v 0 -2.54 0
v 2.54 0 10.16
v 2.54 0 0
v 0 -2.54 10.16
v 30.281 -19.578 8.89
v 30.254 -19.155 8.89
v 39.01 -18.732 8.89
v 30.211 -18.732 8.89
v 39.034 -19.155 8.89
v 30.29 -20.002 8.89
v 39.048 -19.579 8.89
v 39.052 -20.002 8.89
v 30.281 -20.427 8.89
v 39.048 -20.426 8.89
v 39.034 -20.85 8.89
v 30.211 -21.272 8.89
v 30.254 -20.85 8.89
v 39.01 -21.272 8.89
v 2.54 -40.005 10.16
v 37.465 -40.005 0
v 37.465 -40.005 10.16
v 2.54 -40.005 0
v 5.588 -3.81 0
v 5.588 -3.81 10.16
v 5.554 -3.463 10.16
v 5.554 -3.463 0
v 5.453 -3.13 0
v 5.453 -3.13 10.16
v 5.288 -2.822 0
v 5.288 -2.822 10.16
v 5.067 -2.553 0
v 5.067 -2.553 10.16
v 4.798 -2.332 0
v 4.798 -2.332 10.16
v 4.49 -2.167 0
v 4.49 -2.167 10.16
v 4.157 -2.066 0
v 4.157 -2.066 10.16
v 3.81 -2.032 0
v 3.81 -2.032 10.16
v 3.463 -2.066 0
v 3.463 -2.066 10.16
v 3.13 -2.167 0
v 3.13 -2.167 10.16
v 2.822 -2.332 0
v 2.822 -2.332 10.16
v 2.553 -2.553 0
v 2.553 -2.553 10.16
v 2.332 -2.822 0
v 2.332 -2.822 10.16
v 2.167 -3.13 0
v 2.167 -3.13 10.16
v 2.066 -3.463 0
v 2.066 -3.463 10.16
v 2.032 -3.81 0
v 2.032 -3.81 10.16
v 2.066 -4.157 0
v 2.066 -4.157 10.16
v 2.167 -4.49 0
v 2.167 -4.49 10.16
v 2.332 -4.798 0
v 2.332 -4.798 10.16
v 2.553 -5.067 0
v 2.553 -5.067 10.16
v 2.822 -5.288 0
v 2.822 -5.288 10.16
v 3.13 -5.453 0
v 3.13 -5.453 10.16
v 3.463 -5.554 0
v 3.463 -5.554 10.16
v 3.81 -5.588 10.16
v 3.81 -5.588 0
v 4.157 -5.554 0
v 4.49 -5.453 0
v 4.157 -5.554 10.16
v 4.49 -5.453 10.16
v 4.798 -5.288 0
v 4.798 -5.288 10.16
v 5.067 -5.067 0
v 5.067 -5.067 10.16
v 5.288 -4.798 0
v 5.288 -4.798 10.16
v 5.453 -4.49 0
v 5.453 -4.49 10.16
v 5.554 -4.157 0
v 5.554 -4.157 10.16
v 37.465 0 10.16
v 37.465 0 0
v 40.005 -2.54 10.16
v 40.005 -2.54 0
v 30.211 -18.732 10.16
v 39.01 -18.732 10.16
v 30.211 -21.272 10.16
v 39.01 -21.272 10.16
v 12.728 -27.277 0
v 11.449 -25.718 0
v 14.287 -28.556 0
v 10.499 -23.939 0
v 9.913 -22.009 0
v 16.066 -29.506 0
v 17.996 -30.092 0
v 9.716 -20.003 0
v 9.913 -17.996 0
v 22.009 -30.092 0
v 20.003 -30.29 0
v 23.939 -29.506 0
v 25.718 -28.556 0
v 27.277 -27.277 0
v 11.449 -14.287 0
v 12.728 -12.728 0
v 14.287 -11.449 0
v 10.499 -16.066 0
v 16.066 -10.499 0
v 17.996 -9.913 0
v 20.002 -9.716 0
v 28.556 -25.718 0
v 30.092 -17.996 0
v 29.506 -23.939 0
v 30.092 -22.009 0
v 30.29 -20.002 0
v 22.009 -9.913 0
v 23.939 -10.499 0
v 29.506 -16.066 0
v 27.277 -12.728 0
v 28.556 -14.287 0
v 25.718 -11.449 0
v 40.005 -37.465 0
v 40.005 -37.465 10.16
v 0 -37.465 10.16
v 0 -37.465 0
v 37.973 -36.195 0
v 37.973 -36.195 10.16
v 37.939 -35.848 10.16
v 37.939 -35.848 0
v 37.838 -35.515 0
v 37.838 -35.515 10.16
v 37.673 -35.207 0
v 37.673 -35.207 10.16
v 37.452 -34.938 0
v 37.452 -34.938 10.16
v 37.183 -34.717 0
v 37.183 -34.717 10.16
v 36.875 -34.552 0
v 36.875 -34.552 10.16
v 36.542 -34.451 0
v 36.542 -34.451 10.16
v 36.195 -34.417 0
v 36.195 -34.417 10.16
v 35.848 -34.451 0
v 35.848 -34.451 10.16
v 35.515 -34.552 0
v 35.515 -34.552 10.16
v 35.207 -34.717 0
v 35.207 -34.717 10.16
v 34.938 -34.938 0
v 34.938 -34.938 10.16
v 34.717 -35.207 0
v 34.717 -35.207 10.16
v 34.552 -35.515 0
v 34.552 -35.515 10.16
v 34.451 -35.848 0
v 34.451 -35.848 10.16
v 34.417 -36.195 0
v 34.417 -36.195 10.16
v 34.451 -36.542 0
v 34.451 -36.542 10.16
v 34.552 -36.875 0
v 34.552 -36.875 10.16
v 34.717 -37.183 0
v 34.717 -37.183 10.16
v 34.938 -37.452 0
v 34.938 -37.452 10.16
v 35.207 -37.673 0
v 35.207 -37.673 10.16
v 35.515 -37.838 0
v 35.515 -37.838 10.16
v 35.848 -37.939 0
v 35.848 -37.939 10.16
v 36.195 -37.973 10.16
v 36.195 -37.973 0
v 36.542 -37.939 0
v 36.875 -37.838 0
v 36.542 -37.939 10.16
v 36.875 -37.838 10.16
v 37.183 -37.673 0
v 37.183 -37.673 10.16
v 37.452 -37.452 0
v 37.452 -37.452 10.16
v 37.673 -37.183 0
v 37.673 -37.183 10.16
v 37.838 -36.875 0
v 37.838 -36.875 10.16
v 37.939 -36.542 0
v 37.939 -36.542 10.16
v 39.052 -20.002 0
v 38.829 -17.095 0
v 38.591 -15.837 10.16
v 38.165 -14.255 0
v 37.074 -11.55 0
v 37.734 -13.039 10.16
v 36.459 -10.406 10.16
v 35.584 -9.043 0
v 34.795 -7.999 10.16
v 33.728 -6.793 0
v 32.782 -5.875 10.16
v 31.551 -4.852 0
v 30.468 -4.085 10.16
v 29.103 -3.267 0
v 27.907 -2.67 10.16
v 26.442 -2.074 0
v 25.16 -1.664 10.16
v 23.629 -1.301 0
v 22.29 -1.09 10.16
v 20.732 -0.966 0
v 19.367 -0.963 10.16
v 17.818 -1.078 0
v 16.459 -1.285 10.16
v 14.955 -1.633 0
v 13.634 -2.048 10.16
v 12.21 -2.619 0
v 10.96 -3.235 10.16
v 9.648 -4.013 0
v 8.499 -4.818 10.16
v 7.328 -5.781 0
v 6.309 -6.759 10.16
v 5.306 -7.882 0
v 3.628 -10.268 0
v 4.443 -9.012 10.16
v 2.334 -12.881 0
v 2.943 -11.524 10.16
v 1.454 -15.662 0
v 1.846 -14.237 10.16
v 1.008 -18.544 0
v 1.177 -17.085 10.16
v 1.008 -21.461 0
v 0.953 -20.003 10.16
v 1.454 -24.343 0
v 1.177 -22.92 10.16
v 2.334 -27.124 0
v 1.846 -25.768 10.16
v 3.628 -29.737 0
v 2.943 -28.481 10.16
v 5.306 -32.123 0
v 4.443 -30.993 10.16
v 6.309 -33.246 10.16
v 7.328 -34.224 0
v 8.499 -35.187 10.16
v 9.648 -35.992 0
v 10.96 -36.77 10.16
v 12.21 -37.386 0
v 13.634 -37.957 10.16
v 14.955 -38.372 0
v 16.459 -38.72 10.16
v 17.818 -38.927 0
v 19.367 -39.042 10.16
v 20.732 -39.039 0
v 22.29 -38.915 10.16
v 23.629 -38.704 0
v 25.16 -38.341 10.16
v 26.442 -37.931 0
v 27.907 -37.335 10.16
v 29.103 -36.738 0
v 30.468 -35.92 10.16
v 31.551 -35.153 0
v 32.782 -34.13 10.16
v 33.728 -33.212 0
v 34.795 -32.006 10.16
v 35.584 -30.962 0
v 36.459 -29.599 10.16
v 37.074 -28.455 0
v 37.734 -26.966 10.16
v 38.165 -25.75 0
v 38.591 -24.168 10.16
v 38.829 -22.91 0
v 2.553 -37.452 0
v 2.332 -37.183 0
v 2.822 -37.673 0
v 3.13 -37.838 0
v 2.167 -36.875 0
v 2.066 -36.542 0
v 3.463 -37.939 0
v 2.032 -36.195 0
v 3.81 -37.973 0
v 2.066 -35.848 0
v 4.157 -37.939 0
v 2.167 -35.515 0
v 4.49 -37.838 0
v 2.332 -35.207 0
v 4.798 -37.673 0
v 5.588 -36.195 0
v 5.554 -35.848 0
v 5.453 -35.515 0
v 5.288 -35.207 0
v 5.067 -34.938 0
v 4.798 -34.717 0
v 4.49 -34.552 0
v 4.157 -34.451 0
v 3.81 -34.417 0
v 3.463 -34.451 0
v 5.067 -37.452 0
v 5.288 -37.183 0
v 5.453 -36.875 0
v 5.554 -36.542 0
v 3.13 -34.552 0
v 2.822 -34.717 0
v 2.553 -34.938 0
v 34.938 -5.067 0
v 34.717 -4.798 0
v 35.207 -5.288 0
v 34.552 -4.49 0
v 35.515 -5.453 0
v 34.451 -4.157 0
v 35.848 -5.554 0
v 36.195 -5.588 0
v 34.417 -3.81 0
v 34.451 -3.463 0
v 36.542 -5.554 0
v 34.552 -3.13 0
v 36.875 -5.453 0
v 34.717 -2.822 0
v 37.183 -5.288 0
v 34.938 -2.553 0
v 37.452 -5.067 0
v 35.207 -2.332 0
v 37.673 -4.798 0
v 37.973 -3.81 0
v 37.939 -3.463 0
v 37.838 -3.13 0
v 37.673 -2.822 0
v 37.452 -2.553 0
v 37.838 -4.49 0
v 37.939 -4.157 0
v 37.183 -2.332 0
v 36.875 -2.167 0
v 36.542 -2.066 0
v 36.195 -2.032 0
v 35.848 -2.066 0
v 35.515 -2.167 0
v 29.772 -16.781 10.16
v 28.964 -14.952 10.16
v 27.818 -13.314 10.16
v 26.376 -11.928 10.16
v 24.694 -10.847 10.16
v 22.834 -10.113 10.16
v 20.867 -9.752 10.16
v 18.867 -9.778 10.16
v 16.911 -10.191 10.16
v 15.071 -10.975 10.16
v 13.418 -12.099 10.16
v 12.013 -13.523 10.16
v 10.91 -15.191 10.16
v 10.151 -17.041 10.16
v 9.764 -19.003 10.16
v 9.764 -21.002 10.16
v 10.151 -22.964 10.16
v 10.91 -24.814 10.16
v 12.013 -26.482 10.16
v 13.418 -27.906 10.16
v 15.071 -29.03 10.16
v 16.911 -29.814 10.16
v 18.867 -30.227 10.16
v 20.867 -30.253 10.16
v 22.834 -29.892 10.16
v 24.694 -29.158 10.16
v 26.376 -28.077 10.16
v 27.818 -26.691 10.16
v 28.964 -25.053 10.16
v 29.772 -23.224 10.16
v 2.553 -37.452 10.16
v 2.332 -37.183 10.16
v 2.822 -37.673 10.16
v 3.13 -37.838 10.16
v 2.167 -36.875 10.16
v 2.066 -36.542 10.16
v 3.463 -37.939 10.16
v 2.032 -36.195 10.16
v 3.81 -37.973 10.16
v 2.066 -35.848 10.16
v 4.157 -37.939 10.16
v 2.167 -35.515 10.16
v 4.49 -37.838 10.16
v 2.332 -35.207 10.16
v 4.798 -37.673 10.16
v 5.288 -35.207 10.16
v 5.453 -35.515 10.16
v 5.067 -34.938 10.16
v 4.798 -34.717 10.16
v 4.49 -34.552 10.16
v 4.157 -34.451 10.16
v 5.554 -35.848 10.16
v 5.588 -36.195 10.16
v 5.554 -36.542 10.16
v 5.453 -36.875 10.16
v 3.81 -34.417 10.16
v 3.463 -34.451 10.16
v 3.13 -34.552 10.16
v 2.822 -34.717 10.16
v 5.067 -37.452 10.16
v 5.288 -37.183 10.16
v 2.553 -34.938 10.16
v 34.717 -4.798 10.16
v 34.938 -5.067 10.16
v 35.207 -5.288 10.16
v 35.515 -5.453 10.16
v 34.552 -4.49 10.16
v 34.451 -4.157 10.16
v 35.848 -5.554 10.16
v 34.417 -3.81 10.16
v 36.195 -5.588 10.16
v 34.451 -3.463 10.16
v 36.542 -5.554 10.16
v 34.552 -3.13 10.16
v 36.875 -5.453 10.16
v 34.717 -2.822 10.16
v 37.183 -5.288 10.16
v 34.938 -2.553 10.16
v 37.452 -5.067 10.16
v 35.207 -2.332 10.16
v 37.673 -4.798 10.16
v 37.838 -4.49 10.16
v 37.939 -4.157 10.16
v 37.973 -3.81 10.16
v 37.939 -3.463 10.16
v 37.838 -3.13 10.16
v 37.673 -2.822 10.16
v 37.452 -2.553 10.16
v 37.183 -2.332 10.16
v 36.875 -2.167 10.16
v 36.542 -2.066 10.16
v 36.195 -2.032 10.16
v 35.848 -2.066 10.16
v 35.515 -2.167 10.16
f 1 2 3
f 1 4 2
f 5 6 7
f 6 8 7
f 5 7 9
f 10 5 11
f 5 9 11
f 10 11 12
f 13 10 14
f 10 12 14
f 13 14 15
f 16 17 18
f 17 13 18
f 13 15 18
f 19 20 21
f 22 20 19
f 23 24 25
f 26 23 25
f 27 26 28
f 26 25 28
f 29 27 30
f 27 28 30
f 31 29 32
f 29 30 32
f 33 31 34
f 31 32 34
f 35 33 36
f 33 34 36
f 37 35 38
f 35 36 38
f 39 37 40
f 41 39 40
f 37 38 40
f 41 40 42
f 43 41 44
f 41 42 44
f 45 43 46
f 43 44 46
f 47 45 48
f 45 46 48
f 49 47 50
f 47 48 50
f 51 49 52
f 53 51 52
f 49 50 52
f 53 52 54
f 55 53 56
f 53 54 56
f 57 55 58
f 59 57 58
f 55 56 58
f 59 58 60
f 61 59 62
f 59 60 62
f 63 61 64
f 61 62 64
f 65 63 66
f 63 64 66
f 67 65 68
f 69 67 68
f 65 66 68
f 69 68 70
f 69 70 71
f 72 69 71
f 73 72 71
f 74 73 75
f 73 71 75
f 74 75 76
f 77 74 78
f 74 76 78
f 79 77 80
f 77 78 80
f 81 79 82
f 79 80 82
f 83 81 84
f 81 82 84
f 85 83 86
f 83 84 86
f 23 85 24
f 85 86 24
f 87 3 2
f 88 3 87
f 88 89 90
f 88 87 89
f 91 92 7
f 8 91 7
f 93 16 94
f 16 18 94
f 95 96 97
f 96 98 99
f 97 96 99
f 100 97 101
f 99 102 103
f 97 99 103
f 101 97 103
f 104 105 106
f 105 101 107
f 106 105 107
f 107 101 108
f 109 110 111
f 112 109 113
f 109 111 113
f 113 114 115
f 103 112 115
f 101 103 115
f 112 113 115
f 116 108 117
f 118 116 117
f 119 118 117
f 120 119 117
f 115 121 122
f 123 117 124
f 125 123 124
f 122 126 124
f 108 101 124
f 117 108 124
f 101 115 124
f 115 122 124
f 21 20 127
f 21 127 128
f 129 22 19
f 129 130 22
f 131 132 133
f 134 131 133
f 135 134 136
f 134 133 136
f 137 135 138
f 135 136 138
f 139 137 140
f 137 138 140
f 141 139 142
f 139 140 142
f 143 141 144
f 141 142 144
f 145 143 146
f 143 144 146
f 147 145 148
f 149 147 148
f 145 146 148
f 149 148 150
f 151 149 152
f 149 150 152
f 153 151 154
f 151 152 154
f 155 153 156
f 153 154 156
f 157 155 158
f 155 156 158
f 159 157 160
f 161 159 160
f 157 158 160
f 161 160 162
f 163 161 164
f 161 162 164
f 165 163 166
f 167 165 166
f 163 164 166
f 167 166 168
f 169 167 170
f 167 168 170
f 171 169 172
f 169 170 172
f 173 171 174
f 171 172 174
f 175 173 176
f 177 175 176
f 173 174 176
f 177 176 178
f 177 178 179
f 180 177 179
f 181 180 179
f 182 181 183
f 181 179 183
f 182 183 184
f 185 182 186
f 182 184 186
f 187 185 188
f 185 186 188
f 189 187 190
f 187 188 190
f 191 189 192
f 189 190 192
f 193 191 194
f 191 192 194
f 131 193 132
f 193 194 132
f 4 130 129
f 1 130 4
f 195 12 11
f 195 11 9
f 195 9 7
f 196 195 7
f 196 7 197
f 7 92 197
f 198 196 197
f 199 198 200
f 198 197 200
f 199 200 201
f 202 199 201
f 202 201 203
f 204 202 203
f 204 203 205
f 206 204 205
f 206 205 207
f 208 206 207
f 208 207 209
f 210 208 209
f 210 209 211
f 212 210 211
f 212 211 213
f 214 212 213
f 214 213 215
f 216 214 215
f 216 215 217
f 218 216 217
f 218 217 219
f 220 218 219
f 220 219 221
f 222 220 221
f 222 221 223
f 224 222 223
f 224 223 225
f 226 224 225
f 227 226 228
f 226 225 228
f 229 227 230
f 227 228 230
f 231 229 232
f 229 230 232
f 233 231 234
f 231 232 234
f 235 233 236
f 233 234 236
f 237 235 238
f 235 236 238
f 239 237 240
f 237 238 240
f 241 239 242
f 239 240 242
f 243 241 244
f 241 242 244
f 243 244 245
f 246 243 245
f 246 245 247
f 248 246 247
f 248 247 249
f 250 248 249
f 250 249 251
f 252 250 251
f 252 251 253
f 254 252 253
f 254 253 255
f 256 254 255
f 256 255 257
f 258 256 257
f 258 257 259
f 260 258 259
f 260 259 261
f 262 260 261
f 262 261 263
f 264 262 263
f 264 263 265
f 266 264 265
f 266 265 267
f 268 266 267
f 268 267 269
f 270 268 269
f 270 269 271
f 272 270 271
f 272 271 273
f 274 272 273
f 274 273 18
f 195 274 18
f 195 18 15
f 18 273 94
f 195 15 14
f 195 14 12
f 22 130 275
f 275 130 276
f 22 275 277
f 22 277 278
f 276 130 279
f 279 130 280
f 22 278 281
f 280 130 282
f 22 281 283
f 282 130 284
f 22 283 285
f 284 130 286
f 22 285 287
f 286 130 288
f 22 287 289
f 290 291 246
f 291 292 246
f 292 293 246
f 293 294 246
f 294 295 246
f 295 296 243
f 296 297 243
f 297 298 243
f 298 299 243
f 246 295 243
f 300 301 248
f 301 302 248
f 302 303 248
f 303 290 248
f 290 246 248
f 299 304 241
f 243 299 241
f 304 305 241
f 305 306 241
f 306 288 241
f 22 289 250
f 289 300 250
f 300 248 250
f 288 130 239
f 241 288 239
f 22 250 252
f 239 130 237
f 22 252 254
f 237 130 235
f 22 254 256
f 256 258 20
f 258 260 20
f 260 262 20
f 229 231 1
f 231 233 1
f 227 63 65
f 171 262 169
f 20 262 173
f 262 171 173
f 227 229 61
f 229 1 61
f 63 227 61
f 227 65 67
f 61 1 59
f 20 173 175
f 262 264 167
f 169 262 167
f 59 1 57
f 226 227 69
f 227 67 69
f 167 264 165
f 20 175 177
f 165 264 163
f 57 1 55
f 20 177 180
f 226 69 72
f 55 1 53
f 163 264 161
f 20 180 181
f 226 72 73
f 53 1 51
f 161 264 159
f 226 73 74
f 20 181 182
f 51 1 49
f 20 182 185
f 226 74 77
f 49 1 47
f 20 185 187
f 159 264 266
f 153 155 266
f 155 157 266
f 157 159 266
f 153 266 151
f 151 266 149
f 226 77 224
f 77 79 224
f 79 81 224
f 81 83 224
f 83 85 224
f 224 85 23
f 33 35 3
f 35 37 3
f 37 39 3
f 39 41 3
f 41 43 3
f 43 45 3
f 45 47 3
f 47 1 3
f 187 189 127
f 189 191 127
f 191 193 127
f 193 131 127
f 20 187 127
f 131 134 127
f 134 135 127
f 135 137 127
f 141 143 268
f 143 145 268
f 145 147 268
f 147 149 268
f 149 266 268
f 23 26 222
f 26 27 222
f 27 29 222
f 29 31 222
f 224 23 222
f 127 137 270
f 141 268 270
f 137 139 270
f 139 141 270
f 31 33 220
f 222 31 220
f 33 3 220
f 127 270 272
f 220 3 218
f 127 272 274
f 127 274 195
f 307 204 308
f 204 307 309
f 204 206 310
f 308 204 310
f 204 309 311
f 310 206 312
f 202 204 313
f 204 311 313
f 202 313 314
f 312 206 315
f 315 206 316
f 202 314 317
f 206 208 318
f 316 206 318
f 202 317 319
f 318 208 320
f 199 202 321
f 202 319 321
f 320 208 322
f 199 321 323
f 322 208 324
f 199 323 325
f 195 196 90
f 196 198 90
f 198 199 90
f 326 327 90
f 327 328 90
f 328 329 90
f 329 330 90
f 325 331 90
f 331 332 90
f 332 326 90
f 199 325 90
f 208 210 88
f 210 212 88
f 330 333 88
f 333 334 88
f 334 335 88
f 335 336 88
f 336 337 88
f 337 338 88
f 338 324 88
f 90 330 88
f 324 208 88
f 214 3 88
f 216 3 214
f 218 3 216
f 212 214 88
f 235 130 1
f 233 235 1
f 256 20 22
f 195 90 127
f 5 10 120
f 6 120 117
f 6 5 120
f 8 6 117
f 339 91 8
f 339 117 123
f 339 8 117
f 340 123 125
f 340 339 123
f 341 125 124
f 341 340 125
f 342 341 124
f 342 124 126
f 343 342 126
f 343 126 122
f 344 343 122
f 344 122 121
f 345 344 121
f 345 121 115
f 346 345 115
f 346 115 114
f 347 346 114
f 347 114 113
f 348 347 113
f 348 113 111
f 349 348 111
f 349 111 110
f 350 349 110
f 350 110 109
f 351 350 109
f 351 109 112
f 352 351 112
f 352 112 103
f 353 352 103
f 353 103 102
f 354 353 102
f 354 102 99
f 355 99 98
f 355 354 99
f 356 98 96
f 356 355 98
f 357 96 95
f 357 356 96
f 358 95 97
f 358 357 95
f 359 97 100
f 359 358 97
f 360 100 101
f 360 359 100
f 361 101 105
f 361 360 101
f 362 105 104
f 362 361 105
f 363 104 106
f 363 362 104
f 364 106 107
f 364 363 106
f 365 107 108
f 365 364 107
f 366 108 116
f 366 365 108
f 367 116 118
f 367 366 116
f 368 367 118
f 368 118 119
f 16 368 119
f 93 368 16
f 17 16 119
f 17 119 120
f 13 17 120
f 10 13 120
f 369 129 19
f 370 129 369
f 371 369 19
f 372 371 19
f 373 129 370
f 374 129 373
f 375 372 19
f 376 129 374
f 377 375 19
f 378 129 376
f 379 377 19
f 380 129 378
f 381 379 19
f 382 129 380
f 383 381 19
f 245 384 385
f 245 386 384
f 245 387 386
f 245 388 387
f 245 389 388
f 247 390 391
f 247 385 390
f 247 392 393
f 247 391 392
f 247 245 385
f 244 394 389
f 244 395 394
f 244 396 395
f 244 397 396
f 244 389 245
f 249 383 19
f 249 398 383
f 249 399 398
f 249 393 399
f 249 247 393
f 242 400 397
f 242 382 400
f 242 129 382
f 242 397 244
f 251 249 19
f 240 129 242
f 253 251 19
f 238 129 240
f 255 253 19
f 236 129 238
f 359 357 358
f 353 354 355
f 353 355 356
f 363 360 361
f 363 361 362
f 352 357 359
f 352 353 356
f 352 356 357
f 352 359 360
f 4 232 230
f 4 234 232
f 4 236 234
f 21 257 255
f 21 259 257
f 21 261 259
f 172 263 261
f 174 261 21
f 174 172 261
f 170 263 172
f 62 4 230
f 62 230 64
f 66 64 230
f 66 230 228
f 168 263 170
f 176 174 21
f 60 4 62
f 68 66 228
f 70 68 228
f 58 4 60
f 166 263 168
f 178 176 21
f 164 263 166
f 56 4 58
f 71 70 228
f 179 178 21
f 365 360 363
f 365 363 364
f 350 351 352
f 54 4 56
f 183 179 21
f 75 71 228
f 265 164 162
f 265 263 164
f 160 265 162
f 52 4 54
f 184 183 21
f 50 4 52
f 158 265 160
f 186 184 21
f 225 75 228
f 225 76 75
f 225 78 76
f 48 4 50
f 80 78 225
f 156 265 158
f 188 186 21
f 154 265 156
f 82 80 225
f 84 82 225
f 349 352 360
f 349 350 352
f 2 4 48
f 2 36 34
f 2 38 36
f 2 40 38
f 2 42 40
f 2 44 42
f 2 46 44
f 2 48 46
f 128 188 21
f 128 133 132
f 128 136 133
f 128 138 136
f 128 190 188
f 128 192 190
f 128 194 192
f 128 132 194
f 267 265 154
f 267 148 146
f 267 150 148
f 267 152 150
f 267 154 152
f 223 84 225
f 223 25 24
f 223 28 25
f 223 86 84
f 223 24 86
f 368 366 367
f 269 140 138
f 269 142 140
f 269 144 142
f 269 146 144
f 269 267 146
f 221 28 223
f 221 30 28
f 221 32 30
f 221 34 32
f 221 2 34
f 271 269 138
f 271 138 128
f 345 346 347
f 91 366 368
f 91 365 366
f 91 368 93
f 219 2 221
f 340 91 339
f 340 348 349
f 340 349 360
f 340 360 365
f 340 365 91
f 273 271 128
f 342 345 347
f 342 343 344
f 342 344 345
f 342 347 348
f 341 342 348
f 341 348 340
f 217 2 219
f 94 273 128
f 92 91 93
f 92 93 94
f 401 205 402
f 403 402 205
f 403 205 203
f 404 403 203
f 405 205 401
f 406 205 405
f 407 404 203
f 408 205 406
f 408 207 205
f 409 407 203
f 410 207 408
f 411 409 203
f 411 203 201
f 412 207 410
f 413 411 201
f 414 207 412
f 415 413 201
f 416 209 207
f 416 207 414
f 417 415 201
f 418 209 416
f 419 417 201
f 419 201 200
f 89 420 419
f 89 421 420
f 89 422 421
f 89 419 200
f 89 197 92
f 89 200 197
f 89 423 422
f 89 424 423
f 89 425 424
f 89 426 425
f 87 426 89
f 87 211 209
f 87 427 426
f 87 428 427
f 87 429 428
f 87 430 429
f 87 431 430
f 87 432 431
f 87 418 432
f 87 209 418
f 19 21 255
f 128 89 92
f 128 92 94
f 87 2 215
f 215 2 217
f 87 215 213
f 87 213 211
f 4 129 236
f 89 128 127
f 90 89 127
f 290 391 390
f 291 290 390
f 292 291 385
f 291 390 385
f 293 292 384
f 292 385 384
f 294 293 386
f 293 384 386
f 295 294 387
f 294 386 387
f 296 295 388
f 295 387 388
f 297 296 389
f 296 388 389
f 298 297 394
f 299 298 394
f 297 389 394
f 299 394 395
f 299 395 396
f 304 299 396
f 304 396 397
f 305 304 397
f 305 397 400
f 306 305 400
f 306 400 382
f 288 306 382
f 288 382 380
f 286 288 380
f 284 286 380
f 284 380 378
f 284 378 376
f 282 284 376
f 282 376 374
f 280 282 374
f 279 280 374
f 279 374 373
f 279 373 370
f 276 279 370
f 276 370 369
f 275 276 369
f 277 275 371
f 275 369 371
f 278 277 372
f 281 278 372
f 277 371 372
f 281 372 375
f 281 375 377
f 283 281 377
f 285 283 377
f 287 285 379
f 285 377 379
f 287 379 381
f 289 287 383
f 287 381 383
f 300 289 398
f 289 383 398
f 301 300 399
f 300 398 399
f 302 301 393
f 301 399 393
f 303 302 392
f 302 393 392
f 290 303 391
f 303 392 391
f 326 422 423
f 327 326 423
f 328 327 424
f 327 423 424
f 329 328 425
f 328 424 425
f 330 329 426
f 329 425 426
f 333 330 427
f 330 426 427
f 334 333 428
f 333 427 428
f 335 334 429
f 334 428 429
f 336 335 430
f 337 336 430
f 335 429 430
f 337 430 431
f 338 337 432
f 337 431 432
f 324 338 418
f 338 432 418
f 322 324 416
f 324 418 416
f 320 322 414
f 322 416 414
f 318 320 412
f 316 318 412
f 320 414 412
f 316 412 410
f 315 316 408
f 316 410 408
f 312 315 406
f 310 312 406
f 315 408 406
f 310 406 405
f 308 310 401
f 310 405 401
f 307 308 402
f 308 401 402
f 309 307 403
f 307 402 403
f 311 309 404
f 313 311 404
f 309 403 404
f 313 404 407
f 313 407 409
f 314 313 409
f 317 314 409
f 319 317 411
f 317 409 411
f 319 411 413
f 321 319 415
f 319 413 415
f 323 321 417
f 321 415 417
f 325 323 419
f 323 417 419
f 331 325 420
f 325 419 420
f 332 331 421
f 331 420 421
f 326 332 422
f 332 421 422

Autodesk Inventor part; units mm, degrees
ref_plane "YZ Plane" through (0, 0, 0) normal (1, 0, 0) x (0, 1, 0)
ref_plane "XZ Plane" through (0, 0, 0) normal (0, 1, 0) x (-1, 0, 0)
ref_plane "XY Plane" through (0, 0, 0) normal (0, 0, 1) x (1, 0, 0)
sketch "Sketch1" plane through (0, 0, 0) normal (0, 0, 1) x (1, 0, 0)
  line L0 (0, 0) -> (40.005, 0)
  line L1 (40.005, 0) -> (40.005, -40.005)
  line L2 (40.005, -40.005) -> (0, -40.005)
  line L3 (0, -40.005) -> (0, 0)
  dimension "d0" = 40.005
  dimension "d1" = 40.005
extrude "Extrusion1" add sketch "Sketch1" along normal blind 10.16
sketch "Sketch2" plane through (0, 0, 10.16) normal (0, 0, 1) x (1, 0, 0)
  line L0 (40.005, 0) -> (0, 0) projected
  line L1 (0, 0) -> (0, -40.005) projected
  line L2 (0, -40.005) -> (40.005, -40.005) projected
  line L3 (40.005, -40.005) -> (40.005, 0) projected
  circle A0 centre (20.0025, -20.0025) radius 19.05
  circle A1 centre (3.81, -3.81) radius 1.778
  circle A2 centre (36.195, -3.81) radius 1.778
  circle A3 centre (36.195, -36.195) radius 1.778
  circle A4 centre (3.81, -36.195) radius 1.778
  dimension "d4" = 38.1
  dimension "d6" = 3.81
  dimension "d7" = 3.81
  dimension "d8" = 3.81
  dimension "d9" = 3.81
  dimension "d10" = 3.556
  dimension "d11" = 3.556
  dimension "d12" = 3.556
  dimension "d13" = 3.556
extrude "Extrusion2" cut sketch "Sketch2" against normal blind 12.7 contours A0 | A1 | A2 | A3 | A4
sketch "Sketch3" plane through (0, 0, 10.16) normal (0, 0, 1) x (1, 0, 0)
  circle A0 centre (20.0025, -20.0025) radius 19.05 projected
  circle A1 centre (20.0025, -20.0025) radius 10.287
  dimension "d16" = 20.574
extrude "Extrusion3" add sketch "Sketch3" against normal blind 10.16 contours A1
sketch "Sketch4" plane through (40.005, -40.005, 0) normal (1, 0, 0) x (0, 0, -1)
  line L0 (-10.16, 0) -> (-10.16, 40.005) projected
  line L1 (-10.16, 21.2725) -> (-8.89, 21.2725)
  line L2 (-8.89, 21.2725) -> (-8.89, 18.7325)
  line L3 (-8.89, 18.7325) -> (-10.16, 18.7325)
  line L4 (-10.16, 18.7325) -> (-10.16, 21.2725)
  point P0 (-10.16, 20.0025)
  dimension "d20" = 1.27
  dimension "d21" = 1.27
  dimension "d22" = 1.27
extrude "Extrusion4" add sketch "Sketch4" against normal blind 10.16
chamfer "Chamfer1" distance 2.54 angle 45 4 edges at (0, 0, 5.08) (40.005, 0, 5.08) (40.005, -40.005, 5.08) (0, -40.005, 5.08)
properties part number "Fan"
